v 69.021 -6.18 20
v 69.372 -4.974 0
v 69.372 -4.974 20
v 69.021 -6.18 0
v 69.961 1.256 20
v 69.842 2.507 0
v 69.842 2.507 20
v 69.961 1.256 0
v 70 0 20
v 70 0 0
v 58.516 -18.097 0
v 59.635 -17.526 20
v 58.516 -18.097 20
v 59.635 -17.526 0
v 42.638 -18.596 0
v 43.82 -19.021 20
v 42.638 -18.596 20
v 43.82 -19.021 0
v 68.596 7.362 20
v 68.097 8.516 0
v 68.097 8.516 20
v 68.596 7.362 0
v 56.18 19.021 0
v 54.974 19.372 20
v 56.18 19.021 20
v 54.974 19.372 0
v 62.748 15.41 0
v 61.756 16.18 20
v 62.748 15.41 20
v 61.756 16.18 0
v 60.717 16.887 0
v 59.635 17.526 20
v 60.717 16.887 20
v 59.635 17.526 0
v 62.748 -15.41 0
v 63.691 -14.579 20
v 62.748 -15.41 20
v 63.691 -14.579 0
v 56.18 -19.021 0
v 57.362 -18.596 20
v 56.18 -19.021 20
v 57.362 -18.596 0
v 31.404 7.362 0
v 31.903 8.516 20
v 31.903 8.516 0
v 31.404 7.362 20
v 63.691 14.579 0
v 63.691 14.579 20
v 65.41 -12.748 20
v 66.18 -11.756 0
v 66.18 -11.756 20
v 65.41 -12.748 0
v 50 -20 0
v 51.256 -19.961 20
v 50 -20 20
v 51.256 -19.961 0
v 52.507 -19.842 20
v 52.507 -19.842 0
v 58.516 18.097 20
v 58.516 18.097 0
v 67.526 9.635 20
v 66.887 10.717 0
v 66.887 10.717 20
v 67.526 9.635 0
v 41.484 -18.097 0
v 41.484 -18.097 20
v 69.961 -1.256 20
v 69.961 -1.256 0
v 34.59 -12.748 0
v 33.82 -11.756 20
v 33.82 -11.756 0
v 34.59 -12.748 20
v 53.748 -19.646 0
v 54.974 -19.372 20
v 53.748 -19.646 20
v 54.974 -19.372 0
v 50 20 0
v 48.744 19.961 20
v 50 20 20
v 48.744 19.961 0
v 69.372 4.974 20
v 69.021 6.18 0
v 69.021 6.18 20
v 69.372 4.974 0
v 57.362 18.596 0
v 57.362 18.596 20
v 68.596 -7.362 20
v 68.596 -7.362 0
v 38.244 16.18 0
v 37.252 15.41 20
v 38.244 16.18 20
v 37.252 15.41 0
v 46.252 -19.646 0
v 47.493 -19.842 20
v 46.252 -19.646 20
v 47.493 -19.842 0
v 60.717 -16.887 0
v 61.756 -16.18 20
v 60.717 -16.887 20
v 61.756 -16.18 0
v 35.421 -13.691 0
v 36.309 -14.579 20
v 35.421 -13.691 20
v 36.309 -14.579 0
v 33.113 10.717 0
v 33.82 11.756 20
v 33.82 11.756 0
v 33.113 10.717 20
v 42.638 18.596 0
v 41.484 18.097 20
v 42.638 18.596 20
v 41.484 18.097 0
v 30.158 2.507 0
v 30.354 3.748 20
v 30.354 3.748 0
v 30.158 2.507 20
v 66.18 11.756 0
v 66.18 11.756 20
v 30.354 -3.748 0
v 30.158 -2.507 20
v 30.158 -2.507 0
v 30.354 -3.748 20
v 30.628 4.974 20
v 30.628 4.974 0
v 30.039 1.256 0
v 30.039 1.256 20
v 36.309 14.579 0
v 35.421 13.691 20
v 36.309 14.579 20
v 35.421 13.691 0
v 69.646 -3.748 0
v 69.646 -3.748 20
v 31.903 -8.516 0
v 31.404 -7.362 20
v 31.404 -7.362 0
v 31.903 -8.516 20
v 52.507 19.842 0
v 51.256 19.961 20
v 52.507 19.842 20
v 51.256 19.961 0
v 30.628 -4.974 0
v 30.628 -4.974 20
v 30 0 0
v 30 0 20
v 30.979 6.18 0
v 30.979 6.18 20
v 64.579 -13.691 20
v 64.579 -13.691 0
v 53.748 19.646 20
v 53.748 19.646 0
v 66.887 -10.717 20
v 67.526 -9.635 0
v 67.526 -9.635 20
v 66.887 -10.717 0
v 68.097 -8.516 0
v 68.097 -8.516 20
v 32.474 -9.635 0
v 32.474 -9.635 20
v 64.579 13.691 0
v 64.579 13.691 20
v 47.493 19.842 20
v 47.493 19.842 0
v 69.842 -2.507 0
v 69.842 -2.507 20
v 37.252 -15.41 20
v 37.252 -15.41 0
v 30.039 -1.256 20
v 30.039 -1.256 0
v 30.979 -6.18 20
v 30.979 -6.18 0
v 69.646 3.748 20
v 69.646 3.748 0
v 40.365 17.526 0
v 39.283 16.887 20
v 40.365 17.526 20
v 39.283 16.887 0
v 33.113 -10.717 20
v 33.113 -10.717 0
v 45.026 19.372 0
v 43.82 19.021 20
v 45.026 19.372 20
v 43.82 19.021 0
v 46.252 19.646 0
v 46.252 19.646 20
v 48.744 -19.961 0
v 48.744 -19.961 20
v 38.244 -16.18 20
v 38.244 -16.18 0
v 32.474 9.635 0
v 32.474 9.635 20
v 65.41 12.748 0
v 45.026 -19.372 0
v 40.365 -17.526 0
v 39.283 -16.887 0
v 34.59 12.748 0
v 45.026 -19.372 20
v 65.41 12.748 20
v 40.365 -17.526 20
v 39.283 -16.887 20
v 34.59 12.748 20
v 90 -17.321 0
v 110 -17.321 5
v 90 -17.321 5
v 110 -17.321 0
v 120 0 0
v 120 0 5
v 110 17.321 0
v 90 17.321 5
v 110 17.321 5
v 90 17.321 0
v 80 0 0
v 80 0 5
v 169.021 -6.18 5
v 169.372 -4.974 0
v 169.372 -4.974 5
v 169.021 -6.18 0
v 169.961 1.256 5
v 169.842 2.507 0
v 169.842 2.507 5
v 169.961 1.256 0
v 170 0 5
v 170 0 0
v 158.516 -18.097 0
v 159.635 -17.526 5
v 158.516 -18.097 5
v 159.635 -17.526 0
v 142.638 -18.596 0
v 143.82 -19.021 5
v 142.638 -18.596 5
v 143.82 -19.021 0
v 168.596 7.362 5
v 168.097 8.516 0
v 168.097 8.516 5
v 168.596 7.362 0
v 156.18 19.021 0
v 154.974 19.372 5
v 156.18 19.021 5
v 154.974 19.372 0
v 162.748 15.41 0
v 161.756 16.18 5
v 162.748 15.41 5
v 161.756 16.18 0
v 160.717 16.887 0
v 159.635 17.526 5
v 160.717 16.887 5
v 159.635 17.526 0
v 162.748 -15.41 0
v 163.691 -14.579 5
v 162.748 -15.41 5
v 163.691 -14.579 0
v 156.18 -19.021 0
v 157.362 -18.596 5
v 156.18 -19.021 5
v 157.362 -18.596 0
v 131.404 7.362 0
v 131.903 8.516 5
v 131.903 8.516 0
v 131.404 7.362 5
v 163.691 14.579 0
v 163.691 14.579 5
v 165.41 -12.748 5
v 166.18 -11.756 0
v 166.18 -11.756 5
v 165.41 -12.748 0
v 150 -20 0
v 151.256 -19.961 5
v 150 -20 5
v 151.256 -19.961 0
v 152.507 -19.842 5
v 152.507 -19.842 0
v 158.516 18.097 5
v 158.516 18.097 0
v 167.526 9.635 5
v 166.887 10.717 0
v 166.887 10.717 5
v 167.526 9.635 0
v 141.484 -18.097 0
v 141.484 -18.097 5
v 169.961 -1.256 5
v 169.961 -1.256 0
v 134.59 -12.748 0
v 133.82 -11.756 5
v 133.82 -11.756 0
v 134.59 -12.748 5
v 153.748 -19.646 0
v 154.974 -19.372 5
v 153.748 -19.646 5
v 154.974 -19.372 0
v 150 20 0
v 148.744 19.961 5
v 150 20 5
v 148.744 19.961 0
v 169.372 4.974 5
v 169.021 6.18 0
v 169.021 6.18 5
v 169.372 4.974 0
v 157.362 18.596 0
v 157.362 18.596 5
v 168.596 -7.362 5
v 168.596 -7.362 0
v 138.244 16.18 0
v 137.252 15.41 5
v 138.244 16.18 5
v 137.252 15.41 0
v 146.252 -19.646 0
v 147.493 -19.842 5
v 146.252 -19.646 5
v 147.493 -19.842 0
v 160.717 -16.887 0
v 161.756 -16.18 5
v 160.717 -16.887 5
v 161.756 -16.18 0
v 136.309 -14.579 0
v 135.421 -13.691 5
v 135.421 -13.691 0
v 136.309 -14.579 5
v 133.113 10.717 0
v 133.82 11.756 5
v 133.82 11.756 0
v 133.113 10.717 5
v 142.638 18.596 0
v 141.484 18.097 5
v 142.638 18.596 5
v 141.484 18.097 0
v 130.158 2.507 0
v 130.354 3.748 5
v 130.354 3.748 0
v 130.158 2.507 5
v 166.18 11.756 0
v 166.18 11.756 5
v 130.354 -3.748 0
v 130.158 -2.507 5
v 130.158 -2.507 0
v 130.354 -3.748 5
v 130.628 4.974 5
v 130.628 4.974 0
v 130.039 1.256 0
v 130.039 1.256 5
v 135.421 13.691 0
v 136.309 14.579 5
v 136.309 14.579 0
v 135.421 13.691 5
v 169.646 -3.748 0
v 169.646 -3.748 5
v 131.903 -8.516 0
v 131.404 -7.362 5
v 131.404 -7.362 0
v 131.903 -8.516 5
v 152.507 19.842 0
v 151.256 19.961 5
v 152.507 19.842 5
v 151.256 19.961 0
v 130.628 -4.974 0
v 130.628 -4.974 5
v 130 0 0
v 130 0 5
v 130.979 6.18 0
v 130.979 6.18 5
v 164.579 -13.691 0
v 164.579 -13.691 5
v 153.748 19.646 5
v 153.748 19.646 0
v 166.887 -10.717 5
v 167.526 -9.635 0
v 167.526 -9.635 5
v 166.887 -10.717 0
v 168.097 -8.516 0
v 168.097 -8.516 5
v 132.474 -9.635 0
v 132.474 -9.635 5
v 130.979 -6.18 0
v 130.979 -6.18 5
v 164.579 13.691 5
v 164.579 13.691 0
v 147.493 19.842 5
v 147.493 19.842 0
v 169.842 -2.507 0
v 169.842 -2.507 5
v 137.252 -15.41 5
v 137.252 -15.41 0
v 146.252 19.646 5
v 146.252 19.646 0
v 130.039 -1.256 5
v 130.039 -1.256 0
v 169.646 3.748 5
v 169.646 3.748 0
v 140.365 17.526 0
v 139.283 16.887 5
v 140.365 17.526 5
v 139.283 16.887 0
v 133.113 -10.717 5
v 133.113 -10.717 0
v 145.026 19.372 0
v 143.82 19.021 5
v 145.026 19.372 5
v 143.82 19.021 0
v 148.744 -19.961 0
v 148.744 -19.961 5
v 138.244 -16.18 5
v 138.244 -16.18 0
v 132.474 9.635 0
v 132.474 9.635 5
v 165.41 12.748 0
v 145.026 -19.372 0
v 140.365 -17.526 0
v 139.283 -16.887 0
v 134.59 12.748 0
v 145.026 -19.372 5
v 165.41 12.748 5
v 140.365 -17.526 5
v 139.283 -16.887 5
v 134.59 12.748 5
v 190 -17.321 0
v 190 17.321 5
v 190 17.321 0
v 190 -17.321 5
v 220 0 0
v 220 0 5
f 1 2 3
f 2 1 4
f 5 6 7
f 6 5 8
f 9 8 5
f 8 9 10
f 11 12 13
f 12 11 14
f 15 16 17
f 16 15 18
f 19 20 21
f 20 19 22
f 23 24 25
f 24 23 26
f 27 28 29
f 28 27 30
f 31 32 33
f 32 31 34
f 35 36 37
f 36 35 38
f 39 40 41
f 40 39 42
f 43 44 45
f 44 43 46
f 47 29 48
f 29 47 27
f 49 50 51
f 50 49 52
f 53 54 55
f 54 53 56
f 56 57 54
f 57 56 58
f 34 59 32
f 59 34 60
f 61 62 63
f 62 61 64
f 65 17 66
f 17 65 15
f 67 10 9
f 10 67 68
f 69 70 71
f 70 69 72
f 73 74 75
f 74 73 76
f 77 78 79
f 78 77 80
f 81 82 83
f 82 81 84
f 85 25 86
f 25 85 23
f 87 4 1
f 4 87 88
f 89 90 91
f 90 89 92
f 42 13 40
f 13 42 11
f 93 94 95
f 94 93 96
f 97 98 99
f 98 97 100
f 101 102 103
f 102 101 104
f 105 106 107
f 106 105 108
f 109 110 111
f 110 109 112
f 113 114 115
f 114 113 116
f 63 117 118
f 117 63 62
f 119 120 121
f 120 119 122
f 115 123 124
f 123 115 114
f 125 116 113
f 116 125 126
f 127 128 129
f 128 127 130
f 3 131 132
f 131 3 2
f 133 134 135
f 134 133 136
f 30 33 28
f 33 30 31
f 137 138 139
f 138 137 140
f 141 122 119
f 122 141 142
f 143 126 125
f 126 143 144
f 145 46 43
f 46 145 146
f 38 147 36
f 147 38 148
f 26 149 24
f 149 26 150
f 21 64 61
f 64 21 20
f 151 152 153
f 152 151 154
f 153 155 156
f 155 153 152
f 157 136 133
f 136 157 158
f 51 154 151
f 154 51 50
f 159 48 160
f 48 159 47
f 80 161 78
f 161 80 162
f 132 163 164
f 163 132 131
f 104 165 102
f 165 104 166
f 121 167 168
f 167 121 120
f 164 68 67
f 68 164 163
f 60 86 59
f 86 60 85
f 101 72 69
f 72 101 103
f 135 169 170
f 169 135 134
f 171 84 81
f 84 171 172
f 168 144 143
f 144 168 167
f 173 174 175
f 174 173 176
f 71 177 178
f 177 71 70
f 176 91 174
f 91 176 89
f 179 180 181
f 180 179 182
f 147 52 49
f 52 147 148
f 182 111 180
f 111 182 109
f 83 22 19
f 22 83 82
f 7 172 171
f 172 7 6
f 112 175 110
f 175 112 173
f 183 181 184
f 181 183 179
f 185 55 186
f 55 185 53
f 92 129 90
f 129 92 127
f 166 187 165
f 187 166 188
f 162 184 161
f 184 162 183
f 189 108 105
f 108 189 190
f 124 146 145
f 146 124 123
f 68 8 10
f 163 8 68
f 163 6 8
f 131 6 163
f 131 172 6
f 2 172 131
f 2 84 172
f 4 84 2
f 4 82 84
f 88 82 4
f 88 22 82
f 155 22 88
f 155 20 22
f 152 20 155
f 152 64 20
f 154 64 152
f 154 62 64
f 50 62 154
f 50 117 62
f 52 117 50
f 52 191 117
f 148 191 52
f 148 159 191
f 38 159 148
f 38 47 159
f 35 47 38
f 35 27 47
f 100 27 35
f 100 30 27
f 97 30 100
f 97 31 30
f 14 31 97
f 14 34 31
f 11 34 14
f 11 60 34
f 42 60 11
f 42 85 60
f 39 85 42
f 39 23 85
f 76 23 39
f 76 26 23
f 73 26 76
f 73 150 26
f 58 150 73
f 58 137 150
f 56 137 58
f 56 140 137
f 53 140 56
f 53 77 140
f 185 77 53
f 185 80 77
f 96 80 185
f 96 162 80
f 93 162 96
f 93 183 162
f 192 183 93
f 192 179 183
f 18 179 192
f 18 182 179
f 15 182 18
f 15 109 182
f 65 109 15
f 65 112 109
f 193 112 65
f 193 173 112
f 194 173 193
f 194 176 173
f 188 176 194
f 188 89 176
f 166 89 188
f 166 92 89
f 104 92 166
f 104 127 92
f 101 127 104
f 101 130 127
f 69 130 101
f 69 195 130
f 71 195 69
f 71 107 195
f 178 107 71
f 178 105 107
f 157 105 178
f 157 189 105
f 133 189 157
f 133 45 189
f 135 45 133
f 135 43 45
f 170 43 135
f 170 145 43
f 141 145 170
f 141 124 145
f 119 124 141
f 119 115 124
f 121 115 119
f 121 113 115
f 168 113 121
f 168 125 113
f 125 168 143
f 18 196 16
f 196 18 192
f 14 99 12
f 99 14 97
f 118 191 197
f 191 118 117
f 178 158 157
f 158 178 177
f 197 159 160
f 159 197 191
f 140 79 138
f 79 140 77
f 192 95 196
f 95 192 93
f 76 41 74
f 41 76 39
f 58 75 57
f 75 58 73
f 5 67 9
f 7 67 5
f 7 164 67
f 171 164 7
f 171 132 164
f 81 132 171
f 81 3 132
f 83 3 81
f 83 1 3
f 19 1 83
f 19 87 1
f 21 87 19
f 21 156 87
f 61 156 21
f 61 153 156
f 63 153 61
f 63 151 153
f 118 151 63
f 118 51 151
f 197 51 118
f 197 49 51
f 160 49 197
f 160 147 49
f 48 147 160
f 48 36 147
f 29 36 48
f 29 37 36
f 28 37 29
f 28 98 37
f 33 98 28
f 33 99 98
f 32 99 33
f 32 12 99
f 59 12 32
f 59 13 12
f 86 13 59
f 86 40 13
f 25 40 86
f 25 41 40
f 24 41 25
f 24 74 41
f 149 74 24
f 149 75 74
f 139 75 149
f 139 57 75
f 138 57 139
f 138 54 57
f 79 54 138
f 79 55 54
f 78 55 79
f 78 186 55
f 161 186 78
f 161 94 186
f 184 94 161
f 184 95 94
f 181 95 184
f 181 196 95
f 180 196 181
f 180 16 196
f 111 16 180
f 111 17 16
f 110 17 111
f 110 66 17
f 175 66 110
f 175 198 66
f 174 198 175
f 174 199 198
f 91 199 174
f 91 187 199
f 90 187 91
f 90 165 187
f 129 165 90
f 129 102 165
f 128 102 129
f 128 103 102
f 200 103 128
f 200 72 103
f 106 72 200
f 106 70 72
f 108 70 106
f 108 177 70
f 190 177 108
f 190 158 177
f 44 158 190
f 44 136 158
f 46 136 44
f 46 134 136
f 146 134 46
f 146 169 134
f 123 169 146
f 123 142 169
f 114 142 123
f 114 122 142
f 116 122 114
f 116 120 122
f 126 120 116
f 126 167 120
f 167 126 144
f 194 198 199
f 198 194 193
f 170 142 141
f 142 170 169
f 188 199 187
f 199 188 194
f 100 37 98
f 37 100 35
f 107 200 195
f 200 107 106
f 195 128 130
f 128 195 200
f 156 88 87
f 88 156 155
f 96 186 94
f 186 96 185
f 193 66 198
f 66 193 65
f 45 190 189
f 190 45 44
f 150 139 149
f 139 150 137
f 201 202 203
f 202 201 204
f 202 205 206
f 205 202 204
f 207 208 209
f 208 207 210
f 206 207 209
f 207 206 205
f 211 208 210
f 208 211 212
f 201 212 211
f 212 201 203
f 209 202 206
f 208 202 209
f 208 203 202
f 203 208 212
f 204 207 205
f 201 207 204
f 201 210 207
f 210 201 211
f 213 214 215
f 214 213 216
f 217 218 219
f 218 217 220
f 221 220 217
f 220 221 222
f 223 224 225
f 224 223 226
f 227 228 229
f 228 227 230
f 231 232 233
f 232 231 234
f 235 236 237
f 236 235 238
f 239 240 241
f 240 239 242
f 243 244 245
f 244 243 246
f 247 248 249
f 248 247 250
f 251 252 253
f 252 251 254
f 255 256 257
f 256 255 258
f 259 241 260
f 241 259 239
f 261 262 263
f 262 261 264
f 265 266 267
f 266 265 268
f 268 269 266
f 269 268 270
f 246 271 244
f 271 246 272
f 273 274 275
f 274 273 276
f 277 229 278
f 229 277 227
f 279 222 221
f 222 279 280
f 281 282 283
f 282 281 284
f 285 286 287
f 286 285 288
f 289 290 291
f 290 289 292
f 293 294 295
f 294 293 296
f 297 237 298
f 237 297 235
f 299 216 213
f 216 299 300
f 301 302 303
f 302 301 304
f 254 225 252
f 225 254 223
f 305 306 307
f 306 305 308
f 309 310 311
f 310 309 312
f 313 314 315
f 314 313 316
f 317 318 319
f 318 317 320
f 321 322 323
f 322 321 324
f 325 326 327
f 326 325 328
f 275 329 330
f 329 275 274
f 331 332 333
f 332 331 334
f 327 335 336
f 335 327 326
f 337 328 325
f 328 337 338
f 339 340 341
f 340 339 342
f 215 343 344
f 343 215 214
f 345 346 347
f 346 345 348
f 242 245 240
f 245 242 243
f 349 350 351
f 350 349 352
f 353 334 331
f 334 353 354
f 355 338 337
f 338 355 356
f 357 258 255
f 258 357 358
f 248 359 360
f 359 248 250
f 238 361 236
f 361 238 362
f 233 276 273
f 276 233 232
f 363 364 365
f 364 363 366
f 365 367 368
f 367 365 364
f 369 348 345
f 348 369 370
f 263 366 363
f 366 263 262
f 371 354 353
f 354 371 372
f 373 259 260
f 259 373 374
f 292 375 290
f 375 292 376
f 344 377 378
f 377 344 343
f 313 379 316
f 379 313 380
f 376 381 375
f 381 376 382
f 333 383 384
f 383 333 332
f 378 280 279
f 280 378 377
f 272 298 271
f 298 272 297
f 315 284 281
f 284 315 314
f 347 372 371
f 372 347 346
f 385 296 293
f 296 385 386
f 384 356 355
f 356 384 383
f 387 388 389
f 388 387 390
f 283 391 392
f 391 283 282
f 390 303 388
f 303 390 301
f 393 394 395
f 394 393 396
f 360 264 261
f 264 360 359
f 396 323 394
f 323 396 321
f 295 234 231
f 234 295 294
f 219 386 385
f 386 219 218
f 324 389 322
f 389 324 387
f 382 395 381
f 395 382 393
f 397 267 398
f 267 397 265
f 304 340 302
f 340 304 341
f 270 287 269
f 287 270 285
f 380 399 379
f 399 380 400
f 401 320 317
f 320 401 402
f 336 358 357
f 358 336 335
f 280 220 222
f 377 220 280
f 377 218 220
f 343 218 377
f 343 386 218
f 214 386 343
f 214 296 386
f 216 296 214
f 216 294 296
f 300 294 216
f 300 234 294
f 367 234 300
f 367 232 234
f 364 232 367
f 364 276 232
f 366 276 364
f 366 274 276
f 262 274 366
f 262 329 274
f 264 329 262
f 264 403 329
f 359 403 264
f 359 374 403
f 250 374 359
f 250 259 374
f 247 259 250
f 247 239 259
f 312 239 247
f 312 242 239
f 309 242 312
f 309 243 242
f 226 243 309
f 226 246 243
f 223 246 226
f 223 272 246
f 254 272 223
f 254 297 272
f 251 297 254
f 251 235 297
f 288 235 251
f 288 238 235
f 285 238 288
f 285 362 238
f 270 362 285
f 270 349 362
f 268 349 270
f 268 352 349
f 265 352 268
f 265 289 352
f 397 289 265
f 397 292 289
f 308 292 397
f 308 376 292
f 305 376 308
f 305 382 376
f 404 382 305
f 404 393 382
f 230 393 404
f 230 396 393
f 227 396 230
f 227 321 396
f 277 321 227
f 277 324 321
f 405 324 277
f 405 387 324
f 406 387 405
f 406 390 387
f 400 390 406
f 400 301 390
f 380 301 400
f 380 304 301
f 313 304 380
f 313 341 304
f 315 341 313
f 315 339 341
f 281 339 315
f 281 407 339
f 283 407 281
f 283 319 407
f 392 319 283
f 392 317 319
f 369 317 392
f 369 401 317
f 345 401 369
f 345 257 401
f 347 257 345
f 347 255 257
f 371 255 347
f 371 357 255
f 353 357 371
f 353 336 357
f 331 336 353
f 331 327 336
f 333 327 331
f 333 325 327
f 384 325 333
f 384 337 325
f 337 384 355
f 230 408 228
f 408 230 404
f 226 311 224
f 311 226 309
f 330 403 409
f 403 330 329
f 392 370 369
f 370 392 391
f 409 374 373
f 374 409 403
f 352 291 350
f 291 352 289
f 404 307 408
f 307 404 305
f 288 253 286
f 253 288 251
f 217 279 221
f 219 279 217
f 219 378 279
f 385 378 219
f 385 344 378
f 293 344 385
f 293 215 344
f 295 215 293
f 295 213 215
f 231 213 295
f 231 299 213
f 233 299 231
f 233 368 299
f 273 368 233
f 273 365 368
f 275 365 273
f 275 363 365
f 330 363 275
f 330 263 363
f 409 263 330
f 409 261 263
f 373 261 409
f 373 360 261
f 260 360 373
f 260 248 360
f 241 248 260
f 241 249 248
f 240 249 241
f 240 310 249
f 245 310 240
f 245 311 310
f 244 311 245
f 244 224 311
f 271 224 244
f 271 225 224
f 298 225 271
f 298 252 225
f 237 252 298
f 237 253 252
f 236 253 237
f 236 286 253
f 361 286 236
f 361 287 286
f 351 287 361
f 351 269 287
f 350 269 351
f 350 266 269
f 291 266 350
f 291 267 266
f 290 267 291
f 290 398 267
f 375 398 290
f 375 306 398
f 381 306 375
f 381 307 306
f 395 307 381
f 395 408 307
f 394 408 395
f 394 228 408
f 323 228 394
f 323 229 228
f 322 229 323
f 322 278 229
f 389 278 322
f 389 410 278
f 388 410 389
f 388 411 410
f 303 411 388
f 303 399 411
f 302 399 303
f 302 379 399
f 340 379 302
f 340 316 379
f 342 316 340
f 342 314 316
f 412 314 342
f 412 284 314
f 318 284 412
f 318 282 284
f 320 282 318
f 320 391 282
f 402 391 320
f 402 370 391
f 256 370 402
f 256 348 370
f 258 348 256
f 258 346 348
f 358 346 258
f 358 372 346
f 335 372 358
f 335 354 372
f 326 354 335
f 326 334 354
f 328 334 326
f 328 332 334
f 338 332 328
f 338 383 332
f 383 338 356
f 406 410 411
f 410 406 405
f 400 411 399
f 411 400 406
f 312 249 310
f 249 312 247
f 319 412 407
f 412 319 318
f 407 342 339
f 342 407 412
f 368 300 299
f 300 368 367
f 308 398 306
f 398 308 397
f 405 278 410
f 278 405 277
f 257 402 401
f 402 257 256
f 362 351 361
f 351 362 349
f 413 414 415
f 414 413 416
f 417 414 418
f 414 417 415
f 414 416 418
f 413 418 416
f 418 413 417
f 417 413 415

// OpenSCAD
// Vamos a crear un cilidro de radio 20mm y altura 20mm. Para suavizar
//     los polígonos de los lados, podemos incrementar el número de los
//     mismos con el parámetro $fn
translate([50, 0, 0])
    cylinder(r=20, h=20, $fn=100);
    
    
// Vamos a hacer un hexágono cambiando simplemente el número de lados.
translate([100, 0, 0])
    cylinder(r=40/2, h= 5, $fn=6);
// NOTA: Para nosotros, cualquier polígono regular, va a ser un cilindro.


// Hacemos una moneda
translate([150, 0, 0])
    cylinder(r=20, h=5, $fn=100);
    
    
// Hacemos un triángulo equilatero y lo desplazamos
translate([200, 0, 0])
    cylinder(r=40/2, h=5, $fn=3);
